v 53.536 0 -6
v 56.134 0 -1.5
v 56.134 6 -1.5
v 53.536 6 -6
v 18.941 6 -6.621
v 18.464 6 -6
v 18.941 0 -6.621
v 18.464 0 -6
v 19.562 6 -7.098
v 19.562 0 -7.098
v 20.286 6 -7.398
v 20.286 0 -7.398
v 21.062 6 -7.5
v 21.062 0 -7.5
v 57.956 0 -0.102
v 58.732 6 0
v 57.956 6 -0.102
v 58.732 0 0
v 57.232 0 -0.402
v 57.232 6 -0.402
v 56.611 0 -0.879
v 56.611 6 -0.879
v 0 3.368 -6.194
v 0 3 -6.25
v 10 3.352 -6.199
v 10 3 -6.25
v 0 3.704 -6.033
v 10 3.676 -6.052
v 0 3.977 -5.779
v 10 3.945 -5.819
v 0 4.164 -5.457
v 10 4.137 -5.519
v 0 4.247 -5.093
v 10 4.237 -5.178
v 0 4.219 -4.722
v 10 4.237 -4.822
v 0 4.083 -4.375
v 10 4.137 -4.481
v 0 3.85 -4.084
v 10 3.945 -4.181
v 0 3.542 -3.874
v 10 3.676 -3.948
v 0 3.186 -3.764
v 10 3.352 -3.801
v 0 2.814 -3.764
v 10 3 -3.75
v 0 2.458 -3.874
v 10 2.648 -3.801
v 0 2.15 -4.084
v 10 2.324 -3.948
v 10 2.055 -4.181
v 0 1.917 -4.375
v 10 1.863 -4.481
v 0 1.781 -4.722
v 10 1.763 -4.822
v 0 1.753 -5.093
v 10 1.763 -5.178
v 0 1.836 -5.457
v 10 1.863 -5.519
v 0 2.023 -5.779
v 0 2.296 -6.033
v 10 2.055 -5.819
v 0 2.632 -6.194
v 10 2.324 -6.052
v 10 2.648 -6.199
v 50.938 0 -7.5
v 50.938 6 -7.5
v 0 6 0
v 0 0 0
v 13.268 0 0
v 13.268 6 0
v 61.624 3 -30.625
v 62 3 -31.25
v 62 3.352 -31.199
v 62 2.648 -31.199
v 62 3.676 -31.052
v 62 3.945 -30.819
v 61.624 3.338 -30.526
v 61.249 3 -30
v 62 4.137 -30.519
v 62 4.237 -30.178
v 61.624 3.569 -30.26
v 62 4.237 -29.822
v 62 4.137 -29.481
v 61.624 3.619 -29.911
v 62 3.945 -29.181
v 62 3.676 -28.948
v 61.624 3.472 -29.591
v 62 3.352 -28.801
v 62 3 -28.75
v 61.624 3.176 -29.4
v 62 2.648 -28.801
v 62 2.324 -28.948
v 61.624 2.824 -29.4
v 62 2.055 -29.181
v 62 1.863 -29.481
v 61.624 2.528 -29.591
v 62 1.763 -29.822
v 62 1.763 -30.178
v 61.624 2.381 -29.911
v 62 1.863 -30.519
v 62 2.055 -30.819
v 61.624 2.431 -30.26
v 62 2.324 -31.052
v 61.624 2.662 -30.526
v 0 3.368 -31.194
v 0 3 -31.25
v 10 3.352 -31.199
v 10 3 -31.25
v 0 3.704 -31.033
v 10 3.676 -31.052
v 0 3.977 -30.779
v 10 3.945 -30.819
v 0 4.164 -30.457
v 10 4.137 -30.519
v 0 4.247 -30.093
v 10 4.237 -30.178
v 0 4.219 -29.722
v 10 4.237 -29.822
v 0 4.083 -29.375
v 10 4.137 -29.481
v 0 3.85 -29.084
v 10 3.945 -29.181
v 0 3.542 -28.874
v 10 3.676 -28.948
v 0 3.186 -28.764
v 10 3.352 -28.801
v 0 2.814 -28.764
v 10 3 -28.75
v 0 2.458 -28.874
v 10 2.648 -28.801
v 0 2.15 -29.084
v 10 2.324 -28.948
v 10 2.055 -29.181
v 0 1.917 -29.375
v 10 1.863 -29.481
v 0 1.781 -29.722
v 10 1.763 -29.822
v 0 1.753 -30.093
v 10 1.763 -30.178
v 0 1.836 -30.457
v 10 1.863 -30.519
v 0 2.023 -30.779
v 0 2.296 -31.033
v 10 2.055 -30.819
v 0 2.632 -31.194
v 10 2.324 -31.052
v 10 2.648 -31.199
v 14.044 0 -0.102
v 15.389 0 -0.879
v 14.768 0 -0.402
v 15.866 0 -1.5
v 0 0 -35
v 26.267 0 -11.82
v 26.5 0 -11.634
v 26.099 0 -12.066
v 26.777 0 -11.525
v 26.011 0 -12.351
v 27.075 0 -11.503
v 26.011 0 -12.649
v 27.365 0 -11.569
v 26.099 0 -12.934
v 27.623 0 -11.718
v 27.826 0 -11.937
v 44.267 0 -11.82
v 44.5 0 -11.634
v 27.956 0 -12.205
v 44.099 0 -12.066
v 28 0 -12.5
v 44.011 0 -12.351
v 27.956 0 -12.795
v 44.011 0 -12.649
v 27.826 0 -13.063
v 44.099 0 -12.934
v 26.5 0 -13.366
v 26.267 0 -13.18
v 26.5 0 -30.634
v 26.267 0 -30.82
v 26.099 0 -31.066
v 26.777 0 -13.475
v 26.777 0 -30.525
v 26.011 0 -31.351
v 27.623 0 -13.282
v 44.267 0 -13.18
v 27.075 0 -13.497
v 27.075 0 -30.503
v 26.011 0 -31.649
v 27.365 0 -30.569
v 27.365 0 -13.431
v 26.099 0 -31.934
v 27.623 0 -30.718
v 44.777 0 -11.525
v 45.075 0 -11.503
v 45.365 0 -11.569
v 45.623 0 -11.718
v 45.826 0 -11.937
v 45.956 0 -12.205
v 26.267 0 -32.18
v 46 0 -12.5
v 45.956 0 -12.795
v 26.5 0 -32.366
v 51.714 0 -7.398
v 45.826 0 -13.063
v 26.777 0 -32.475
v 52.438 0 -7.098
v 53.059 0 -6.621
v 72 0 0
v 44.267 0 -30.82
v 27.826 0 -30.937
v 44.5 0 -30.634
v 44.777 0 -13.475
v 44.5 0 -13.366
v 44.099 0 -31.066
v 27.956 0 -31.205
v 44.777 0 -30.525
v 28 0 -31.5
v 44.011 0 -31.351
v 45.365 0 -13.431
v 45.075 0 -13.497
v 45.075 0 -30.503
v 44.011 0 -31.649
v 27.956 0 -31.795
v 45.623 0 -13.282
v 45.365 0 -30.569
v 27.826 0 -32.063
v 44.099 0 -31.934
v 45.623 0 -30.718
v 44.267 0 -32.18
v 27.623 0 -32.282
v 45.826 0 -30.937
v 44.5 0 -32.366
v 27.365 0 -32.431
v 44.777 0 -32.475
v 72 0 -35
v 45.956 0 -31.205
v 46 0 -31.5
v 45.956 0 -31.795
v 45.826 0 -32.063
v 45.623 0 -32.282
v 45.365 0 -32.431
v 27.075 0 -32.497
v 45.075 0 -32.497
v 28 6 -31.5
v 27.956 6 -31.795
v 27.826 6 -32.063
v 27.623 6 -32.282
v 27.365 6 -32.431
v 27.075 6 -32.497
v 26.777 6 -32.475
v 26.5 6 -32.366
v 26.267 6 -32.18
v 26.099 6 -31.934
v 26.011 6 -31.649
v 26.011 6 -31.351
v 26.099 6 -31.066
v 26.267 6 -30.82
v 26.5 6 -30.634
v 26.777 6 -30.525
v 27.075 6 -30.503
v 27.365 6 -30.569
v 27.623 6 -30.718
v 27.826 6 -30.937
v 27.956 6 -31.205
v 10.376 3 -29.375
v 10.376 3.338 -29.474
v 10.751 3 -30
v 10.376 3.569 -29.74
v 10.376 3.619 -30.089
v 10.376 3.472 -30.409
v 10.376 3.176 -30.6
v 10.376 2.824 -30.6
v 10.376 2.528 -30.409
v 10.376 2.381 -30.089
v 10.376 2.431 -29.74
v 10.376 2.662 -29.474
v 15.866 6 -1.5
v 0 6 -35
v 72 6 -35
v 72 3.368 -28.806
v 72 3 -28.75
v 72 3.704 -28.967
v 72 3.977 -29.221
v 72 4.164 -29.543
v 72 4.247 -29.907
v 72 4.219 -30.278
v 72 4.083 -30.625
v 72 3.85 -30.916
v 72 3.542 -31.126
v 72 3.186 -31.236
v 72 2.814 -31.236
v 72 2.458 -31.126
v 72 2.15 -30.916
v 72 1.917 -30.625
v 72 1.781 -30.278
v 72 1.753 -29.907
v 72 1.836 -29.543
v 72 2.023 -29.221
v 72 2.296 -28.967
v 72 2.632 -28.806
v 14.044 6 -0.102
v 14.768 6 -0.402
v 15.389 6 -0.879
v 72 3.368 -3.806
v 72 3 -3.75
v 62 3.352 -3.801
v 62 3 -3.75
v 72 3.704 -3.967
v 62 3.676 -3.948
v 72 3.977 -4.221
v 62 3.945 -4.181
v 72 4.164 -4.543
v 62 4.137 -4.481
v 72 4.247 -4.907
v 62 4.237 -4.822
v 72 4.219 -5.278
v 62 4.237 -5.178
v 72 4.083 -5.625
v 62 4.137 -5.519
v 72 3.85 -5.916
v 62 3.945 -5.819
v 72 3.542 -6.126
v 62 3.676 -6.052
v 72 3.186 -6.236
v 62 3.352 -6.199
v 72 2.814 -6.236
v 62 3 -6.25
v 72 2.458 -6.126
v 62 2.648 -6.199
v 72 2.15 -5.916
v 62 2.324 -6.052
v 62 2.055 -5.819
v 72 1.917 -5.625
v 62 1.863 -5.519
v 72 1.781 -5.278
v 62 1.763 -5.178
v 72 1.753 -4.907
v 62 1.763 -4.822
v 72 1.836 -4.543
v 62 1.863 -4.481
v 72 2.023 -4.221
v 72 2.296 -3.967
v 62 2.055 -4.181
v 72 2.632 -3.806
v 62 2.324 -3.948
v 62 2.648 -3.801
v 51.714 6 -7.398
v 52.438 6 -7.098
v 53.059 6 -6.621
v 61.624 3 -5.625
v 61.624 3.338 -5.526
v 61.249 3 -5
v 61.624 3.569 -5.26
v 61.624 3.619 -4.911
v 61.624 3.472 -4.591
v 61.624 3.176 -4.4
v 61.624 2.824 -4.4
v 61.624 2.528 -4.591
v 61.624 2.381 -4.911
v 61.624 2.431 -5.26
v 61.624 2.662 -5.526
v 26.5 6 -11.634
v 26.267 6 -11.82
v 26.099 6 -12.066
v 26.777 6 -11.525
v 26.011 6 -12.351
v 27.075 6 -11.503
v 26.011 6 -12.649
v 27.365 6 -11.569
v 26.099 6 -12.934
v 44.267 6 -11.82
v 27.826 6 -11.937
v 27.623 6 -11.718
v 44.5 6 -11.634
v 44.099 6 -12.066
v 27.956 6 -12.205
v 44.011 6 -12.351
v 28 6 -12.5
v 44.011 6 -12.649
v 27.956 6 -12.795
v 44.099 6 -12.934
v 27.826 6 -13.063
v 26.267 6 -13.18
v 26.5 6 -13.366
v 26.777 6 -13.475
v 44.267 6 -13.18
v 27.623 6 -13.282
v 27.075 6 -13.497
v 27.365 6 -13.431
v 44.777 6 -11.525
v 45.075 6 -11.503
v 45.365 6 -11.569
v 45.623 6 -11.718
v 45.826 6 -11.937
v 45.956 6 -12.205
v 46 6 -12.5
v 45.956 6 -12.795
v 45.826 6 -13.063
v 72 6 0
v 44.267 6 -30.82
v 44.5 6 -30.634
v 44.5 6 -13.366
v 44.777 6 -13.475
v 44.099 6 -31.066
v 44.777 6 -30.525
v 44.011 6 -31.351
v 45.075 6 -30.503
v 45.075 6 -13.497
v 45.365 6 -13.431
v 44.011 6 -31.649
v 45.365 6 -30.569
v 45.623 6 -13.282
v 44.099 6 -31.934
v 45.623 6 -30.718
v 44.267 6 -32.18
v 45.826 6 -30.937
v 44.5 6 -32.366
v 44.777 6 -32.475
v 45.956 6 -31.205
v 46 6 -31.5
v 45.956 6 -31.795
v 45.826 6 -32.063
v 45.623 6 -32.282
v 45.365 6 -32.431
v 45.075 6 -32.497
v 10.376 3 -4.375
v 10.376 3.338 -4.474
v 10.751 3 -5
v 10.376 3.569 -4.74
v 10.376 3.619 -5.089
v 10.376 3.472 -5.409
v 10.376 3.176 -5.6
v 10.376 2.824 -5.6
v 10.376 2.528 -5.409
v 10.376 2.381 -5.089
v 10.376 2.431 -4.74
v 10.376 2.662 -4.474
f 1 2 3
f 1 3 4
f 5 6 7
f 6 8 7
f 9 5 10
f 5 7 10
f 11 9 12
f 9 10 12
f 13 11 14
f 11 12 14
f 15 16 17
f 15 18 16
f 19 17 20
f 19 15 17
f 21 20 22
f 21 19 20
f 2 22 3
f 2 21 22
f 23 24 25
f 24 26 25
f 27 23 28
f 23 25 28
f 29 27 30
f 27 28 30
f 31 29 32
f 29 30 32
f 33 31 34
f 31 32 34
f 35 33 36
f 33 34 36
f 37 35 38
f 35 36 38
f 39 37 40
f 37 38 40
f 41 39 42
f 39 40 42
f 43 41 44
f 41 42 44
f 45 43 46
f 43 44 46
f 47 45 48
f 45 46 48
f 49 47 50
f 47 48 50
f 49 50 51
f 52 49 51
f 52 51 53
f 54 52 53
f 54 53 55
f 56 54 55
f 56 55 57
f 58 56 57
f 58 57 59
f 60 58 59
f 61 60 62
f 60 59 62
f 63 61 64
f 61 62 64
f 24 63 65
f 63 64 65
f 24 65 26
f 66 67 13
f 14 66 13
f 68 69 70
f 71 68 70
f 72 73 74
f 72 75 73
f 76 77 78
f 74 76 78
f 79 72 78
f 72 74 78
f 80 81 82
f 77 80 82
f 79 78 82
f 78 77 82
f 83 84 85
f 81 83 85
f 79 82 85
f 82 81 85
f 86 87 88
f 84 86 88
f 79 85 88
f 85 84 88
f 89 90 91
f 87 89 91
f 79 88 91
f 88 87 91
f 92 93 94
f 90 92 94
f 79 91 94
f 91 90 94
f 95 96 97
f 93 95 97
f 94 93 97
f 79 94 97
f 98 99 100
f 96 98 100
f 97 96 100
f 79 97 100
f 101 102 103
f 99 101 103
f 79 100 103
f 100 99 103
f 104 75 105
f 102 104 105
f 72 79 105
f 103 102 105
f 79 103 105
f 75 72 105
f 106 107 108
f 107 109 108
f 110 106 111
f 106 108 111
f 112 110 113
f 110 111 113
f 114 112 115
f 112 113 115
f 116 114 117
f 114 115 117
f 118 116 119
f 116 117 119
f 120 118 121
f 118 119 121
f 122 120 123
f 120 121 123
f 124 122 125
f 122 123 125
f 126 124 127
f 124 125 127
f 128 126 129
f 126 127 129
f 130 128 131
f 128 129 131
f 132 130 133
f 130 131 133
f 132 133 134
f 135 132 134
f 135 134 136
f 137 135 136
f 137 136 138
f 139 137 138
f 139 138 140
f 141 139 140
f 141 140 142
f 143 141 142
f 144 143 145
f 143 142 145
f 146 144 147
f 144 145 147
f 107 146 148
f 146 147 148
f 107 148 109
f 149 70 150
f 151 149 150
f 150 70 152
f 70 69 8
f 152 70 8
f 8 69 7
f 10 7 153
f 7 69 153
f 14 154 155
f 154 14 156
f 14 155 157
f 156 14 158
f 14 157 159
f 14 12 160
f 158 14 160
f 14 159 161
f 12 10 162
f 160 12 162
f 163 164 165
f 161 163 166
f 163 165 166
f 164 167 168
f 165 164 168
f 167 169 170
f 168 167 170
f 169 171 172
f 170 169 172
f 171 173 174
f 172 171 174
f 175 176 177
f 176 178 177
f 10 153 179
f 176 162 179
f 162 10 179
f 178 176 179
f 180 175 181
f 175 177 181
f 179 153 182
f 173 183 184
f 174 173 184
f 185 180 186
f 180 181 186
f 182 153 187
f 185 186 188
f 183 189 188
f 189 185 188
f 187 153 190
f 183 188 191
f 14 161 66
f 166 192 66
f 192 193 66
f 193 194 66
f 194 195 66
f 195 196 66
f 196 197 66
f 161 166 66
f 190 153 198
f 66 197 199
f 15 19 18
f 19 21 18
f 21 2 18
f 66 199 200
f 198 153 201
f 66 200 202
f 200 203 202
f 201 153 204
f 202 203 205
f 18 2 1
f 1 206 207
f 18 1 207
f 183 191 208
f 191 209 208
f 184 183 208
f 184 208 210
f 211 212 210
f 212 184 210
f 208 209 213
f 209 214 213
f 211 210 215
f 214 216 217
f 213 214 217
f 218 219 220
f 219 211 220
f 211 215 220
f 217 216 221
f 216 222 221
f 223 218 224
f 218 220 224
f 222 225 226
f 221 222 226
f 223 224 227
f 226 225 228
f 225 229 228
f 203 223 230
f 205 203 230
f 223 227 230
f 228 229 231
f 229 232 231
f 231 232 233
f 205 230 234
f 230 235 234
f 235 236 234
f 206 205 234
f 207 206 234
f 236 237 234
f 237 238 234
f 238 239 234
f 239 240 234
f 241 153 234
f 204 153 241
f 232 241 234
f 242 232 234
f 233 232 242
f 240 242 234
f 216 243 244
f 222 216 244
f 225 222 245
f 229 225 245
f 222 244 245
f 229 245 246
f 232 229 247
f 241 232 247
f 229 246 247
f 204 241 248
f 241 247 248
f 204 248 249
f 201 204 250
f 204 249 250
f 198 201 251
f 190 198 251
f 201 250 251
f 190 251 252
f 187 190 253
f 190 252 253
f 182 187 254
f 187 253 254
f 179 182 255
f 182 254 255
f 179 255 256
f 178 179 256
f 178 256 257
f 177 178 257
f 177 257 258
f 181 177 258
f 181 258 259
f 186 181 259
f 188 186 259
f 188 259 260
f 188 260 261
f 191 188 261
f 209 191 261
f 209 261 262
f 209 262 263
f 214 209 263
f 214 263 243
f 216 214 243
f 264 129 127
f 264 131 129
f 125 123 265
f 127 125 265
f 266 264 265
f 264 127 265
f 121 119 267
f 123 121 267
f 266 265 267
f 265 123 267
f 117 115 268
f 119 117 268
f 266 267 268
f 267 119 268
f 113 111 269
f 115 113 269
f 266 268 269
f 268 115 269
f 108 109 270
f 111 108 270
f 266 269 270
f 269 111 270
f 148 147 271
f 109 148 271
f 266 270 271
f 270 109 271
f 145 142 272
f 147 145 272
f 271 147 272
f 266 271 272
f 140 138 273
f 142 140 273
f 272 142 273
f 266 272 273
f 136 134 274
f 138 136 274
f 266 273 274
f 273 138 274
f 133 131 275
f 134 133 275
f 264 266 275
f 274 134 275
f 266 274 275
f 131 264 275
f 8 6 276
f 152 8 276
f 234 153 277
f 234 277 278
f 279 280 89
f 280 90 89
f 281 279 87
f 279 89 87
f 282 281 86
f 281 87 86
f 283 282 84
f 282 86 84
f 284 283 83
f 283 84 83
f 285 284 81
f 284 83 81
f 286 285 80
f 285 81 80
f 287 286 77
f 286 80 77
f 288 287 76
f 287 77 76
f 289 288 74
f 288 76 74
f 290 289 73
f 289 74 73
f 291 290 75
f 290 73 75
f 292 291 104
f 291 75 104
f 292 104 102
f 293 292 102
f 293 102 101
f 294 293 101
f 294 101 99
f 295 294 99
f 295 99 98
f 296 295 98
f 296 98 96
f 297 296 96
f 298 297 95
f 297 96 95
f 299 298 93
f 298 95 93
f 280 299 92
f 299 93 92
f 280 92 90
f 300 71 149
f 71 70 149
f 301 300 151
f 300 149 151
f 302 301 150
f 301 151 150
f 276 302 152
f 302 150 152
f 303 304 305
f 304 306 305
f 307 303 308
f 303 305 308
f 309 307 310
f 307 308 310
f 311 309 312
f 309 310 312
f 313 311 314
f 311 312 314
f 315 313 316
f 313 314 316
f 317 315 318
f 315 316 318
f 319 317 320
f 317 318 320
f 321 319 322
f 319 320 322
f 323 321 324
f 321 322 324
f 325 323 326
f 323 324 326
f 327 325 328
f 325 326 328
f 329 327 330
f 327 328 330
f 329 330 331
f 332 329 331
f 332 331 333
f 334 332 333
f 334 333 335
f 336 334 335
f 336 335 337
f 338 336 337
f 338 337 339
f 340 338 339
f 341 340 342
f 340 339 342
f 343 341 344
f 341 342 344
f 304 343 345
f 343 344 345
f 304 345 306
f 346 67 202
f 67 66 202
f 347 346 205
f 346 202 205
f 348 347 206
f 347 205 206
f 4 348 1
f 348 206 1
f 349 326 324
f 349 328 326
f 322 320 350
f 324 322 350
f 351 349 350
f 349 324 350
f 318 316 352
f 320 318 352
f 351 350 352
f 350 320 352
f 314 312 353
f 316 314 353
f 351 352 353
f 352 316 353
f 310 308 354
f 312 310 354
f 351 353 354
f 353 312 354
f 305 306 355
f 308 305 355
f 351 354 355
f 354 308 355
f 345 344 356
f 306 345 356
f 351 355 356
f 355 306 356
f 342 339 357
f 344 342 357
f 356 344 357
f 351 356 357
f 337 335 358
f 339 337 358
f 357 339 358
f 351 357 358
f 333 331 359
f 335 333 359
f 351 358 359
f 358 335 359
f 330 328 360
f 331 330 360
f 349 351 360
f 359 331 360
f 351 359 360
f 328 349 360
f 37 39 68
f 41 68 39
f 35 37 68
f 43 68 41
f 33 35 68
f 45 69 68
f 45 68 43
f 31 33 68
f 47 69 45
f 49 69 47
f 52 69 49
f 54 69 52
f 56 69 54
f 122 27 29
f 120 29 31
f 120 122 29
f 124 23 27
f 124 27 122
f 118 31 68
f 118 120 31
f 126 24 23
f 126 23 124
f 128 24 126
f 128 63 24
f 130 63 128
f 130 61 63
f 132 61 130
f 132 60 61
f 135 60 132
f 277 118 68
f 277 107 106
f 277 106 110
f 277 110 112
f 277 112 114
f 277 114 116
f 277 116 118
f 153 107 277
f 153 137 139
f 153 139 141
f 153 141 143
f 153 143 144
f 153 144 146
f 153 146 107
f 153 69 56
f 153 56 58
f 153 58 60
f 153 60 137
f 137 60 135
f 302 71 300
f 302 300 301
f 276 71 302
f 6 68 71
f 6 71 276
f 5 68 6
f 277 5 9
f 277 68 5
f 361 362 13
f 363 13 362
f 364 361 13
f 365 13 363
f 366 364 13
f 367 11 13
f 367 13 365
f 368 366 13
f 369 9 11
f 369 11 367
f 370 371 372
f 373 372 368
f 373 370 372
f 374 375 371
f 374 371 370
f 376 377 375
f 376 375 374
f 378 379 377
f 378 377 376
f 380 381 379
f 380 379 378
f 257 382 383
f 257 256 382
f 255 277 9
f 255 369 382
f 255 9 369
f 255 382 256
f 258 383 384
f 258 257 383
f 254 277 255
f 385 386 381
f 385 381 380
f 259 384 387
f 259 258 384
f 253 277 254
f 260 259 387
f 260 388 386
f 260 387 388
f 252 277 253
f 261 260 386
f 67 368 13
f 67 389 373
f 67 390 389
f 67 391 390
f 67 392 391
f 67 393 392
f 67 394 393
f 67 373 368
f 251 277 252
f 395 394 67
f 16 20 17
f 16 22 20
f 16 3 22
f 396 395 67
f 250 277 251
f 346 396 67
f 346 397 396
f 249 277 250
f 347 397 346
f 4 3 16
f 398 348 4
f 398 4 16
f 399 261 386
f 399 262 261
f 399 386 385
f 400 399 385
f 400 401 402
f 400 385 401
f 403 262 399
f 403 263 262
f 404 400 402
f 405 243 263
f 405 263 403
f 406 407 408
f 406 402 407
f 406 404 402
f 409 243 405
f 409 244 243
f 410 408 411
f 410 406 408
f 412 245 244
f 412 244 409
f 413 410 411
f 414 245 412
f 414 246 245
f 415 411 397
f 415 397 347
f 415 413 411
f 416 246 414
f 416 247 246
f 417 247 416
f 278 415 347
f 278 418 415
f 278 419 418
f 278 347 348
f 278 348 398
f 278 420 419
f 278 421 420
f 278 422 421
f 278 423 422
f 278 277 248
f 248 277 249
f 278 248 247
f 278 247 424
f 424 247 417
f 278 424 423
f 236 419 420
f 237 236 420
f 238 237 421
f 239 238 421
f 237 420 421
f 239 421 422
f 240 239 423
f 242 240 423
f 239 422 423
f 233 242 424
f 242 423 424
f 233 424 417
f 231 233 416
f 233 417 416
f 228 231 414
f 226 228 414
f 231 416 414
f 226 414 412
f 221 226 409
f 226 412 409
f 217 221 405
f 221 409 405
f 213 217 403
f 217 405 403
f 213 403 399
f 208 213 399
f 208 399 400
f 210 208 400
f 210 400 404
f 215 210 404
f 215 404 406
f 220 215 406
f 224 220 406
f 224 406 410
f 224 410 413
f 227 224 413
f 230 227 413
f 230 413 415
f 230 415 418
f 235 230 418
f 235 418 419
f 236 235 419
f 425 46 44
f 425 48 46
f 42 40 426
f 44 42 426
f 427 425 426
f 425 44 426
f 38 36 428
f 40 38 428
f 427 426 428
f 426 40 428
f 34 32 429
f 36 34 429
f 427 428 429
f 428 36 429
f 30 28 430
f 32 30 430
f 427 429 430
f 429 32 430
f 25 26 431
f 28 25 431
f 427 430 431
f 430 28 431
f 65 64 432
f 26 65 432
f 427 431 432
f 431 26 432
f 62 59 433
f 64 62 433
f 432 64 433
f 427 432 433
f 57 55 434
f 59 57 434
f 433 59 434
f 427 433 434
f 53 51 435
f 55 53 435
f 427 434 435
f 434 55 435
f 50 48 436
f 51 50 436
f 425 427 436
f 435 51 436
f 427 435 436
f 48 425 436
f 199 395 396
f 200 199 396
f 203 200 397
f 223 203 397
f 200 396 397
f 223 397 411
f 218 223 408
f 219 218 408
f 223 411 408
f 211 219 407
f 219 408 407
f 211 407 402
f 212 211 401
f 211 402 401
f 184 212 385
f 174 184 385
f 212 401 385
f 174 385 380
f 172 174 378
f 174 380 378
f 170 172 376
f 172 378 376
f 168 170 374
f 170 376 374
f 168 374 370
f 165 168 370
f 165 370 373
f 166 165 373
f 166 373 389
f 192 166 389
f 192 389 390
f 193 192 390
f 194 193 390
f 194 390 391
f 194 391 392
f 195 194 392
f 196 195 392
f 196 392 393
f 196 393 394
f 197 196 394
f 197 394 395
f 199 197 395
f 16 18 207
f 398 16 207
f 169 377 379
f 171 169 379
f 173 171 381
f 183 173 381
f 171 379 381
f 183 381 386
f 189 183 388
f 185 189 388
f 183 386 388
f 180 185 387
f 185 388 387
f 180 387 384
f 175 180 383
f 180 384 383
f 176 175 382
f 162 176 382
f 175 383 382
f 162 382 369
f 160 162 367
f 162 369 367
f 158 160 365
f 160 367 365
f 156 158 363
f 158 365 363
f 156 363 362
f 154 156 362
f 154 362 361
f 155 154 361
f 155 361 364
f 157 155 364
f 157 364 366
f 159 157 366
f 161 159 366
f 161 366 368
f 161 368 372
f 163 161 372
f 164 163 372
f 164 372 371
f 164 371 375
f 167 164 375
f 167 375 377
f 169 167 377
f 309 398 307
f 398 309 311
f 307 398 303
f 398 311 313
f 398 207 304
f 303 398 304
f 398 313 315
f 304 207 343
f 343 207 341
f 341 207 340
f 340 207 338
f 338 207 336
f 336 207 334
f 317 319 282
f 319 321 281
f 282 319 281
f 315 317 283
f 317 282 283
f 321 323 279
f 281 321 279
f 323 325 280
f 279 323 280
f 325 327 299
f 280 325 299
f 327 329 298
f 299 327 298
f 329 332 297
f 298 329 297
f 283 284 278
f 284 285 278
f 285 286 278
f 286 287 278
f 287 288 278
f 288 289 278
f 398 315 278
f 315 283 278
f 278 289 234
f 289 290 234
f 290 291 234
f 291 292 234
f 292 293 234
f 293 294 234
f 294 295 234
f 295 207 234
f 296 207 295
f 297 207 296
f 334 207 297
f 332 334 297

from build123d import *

# Parameters (mm, degrees)
SKETCH1_W                   = 72
SKETCH1_H                   = 35
BOSS_EXTRUDE1_DEPTH         = 6
CUT_EXTRUDE3_REACH          = 8
CUT_EXTRUDE4_REACH          = 8
SKETCH5_R                   = 1
FILLET1_R                   = 3
TAP_DRILL_FOR_M3_TAP1_D     = 2.5
TAP_DRILL_FOR_M3_TAP1_DEPTH = 10
TAP_DRILL_FOR_M3_TAP1_TIP   = 0.751075774
TAP_DRILL_FOR_M3_TAP2_D     = 2.5
TAP_DRILL_FOR_M3_TAP2_DEPTH = 10
TAP_DRILL_FOR_M3_TAP2_TIP   = 0.751075774


with BuildPart() as part:
    # Sketch1 → Boss-Extrude1 (new body)
    with BuildSketch(Plane(origin=(0, 0, 0), x_dir=(1, 0, 0), z_dir=(0, 1, 0))):
        with Locations((36, 17.5)):
            Rectangle(SKETCH1_W, SKETCH1_H)
    extrude(amount=BOSS_EXTRUDE1_DEPTH)

    # Sketch4 → Cut-Extrude3 (cut, up to next)
    with BuildSketch(Plane(origin=(0, 6, 0), x_dir=(1, 0, 0), z_dir=(0, 1, 0)), mode=Mode.PRIVATE) as cut_extrude3_sk1:
        Polygon((15, 0), (57, 0), (52.669872981, 7.5), (19.330127019, 7.5), align=None)
    cut_extrude3_tool1 = extrude(cut_extrude3_sk1.sketch, amount=-CUT_EXTRUDE3_REACH, mode=Mode.PRIVATE) & part.part
    add(cut_extrude3_tool1.solids().sort_by_distance((36, 6, -3.606313))[0], mode=Mode.SUBTRACT)

    # Sketch5 → Cut-Extrude4 (cut, up to next)
    with BuildSketch(Plane(origin=(0, 6, 0), x_dir=(1, 0, 0), z_dir=(0, 1, 0)), mode=Mode.PRIVATE) as cut_extrude4_sk1:
        with Locations((27, 12.5)):
            Circle(SKETCH5_R)
    cut_extrude4_tool1 = extrude(cut_extrude4_sk1.sketch, amount=-CUT_EXTRUDE4_REACH, mode=Mode.PRIVATE) & part.part
    add(cut_extrude4_tool1.solids().sort_by_distance((27, 6, -12.5))[0], mode=Mode.SUBTRACT)
    # Sketch5 → Cut-Extrude4 (cut, up to next)
    with BuildSketch(Plane(origin=(0, 6, 0), x_dir=(1, 0, 0), z_dir=(0, 1, 0)), mode=Mode.PRIVATE) as cut_extrude4_sk2:
        with Locations((45, 12.5)):
            Circle(SKETCH5_R)
    cut_extrude4_tool2 = extrude(cut_extrude4_sk2.sketch, amount=-CUT_EXTRUDE4_REACH, mode=Mode.PRIVATE) & part.part
    add(cut_extrude4_tool2.solids().sort_by_distance((45, 6, -12.5))[0], mode=Mode.SUBTRACT)
    # Sketch5 → Cut-Extrude4 (cut, up to next)
    with BuildSketch(Plane(origin=(0, 6, 0), x_dir=(1, 0, 0), z_dir=(0, 1, 0)), mode=Mode.PRIVATE) as cut_extrude4_sk3:
        with Locations((45, 31.5)):
            Circle(SKETCH5_R)
    cut_extrude4_tool3 = extrude(cut_extrude4_sk3.sketch, amount=-CUT_EXTRUDE4_REACH, mode=Mode.PRIVATE) & part.part
    add(cut_extrude4_tool3.solids().sort_by_distance((45, 6, -31.5))[0], mode=Mode.SUBTRACT)
    # Sketch5 → Cut-Extrude4 (cut, up to next)
    with BuildSketch(Plane(origin=(0, 6, 0), x_dir=(1, 0, 0), z_dir=(0, 1, 0)), mode=Mode.PRIVATE) as cut_extrude4_sk4:
        with Locations((27, 31.5)):
            Circle(SKETCH5_R)
    cut_extrude4_tool4 = extrude(cut_extrude4_sk4.sketch, amount=-CUT_EXTRUDE4_REACH, mode=Mode.PRIVATE) & part.part
    add(cut_extrude4_tool4.solids().sort_by_distance((27, 6, -31.5))[0], mode=Mode.SUBTRACT)

    # Fillet1
    fillet1_edges = [part.edges().sort_by_distance(p)[0] for p in [
        (15, 3, 0),
        (19.330127019, 3, -7.5),
        (52.669872981, 3, -7.5),
        (57, 3, 0),
    ]]
    fillet(fillet1_edges, radius=FILLET1_R)

    # Tap Drill for M3 Tap1
    with Locations(Plane.ZY):
        with Locations((-30, 3), (-5, 3)):
            Hole(TAP_DRILL_FOR_M3_TAP1_D / 2, depth=TAP_DRILL_FOR_M3_TAP1_DEPTH)
            with Locations((0, 0, -(TAP_DRILL_FOR_M3_TAP1_DEPTH + TAP_DRILL_FOR_M3_TAP1_TIP / 2))):  # 118° drill point
                Cone(0, TAP_DRILL_FOR_M3_TAP1_D / 2, TAP_DRILL_FOR_M3_TAP1_TIP, mode=Mode.SUBTRACT)

    # Tap Drill for M3 Tap2
    with Locations(Plane(origin=(72, 0, 0), x_dir=(0, 0, -1), z_dir=(1, 0, 0))):
        with Locations((5, 3), (30, 3)):
            Hole(TAP_DRILL_FOR_M3_TAP2_D / 2, depth=TAP_DRILL_FOR_M3_TAP2_DEPTH)
            with Locations((0, 0, -(TAP_DRILL_FOR_M3_TAP2_DEPTH + TAP_DRILL_FOR_M3_TAP2_TIP / 2))):  # 118° drill point
                Cone(0, TAP_DRILL_FOR_M3_TAP2_D / 2, TAP_DRILL_FOR_M3_TAP2_TIP, mode=Mode.SUBTRACT)


solid = part.part
